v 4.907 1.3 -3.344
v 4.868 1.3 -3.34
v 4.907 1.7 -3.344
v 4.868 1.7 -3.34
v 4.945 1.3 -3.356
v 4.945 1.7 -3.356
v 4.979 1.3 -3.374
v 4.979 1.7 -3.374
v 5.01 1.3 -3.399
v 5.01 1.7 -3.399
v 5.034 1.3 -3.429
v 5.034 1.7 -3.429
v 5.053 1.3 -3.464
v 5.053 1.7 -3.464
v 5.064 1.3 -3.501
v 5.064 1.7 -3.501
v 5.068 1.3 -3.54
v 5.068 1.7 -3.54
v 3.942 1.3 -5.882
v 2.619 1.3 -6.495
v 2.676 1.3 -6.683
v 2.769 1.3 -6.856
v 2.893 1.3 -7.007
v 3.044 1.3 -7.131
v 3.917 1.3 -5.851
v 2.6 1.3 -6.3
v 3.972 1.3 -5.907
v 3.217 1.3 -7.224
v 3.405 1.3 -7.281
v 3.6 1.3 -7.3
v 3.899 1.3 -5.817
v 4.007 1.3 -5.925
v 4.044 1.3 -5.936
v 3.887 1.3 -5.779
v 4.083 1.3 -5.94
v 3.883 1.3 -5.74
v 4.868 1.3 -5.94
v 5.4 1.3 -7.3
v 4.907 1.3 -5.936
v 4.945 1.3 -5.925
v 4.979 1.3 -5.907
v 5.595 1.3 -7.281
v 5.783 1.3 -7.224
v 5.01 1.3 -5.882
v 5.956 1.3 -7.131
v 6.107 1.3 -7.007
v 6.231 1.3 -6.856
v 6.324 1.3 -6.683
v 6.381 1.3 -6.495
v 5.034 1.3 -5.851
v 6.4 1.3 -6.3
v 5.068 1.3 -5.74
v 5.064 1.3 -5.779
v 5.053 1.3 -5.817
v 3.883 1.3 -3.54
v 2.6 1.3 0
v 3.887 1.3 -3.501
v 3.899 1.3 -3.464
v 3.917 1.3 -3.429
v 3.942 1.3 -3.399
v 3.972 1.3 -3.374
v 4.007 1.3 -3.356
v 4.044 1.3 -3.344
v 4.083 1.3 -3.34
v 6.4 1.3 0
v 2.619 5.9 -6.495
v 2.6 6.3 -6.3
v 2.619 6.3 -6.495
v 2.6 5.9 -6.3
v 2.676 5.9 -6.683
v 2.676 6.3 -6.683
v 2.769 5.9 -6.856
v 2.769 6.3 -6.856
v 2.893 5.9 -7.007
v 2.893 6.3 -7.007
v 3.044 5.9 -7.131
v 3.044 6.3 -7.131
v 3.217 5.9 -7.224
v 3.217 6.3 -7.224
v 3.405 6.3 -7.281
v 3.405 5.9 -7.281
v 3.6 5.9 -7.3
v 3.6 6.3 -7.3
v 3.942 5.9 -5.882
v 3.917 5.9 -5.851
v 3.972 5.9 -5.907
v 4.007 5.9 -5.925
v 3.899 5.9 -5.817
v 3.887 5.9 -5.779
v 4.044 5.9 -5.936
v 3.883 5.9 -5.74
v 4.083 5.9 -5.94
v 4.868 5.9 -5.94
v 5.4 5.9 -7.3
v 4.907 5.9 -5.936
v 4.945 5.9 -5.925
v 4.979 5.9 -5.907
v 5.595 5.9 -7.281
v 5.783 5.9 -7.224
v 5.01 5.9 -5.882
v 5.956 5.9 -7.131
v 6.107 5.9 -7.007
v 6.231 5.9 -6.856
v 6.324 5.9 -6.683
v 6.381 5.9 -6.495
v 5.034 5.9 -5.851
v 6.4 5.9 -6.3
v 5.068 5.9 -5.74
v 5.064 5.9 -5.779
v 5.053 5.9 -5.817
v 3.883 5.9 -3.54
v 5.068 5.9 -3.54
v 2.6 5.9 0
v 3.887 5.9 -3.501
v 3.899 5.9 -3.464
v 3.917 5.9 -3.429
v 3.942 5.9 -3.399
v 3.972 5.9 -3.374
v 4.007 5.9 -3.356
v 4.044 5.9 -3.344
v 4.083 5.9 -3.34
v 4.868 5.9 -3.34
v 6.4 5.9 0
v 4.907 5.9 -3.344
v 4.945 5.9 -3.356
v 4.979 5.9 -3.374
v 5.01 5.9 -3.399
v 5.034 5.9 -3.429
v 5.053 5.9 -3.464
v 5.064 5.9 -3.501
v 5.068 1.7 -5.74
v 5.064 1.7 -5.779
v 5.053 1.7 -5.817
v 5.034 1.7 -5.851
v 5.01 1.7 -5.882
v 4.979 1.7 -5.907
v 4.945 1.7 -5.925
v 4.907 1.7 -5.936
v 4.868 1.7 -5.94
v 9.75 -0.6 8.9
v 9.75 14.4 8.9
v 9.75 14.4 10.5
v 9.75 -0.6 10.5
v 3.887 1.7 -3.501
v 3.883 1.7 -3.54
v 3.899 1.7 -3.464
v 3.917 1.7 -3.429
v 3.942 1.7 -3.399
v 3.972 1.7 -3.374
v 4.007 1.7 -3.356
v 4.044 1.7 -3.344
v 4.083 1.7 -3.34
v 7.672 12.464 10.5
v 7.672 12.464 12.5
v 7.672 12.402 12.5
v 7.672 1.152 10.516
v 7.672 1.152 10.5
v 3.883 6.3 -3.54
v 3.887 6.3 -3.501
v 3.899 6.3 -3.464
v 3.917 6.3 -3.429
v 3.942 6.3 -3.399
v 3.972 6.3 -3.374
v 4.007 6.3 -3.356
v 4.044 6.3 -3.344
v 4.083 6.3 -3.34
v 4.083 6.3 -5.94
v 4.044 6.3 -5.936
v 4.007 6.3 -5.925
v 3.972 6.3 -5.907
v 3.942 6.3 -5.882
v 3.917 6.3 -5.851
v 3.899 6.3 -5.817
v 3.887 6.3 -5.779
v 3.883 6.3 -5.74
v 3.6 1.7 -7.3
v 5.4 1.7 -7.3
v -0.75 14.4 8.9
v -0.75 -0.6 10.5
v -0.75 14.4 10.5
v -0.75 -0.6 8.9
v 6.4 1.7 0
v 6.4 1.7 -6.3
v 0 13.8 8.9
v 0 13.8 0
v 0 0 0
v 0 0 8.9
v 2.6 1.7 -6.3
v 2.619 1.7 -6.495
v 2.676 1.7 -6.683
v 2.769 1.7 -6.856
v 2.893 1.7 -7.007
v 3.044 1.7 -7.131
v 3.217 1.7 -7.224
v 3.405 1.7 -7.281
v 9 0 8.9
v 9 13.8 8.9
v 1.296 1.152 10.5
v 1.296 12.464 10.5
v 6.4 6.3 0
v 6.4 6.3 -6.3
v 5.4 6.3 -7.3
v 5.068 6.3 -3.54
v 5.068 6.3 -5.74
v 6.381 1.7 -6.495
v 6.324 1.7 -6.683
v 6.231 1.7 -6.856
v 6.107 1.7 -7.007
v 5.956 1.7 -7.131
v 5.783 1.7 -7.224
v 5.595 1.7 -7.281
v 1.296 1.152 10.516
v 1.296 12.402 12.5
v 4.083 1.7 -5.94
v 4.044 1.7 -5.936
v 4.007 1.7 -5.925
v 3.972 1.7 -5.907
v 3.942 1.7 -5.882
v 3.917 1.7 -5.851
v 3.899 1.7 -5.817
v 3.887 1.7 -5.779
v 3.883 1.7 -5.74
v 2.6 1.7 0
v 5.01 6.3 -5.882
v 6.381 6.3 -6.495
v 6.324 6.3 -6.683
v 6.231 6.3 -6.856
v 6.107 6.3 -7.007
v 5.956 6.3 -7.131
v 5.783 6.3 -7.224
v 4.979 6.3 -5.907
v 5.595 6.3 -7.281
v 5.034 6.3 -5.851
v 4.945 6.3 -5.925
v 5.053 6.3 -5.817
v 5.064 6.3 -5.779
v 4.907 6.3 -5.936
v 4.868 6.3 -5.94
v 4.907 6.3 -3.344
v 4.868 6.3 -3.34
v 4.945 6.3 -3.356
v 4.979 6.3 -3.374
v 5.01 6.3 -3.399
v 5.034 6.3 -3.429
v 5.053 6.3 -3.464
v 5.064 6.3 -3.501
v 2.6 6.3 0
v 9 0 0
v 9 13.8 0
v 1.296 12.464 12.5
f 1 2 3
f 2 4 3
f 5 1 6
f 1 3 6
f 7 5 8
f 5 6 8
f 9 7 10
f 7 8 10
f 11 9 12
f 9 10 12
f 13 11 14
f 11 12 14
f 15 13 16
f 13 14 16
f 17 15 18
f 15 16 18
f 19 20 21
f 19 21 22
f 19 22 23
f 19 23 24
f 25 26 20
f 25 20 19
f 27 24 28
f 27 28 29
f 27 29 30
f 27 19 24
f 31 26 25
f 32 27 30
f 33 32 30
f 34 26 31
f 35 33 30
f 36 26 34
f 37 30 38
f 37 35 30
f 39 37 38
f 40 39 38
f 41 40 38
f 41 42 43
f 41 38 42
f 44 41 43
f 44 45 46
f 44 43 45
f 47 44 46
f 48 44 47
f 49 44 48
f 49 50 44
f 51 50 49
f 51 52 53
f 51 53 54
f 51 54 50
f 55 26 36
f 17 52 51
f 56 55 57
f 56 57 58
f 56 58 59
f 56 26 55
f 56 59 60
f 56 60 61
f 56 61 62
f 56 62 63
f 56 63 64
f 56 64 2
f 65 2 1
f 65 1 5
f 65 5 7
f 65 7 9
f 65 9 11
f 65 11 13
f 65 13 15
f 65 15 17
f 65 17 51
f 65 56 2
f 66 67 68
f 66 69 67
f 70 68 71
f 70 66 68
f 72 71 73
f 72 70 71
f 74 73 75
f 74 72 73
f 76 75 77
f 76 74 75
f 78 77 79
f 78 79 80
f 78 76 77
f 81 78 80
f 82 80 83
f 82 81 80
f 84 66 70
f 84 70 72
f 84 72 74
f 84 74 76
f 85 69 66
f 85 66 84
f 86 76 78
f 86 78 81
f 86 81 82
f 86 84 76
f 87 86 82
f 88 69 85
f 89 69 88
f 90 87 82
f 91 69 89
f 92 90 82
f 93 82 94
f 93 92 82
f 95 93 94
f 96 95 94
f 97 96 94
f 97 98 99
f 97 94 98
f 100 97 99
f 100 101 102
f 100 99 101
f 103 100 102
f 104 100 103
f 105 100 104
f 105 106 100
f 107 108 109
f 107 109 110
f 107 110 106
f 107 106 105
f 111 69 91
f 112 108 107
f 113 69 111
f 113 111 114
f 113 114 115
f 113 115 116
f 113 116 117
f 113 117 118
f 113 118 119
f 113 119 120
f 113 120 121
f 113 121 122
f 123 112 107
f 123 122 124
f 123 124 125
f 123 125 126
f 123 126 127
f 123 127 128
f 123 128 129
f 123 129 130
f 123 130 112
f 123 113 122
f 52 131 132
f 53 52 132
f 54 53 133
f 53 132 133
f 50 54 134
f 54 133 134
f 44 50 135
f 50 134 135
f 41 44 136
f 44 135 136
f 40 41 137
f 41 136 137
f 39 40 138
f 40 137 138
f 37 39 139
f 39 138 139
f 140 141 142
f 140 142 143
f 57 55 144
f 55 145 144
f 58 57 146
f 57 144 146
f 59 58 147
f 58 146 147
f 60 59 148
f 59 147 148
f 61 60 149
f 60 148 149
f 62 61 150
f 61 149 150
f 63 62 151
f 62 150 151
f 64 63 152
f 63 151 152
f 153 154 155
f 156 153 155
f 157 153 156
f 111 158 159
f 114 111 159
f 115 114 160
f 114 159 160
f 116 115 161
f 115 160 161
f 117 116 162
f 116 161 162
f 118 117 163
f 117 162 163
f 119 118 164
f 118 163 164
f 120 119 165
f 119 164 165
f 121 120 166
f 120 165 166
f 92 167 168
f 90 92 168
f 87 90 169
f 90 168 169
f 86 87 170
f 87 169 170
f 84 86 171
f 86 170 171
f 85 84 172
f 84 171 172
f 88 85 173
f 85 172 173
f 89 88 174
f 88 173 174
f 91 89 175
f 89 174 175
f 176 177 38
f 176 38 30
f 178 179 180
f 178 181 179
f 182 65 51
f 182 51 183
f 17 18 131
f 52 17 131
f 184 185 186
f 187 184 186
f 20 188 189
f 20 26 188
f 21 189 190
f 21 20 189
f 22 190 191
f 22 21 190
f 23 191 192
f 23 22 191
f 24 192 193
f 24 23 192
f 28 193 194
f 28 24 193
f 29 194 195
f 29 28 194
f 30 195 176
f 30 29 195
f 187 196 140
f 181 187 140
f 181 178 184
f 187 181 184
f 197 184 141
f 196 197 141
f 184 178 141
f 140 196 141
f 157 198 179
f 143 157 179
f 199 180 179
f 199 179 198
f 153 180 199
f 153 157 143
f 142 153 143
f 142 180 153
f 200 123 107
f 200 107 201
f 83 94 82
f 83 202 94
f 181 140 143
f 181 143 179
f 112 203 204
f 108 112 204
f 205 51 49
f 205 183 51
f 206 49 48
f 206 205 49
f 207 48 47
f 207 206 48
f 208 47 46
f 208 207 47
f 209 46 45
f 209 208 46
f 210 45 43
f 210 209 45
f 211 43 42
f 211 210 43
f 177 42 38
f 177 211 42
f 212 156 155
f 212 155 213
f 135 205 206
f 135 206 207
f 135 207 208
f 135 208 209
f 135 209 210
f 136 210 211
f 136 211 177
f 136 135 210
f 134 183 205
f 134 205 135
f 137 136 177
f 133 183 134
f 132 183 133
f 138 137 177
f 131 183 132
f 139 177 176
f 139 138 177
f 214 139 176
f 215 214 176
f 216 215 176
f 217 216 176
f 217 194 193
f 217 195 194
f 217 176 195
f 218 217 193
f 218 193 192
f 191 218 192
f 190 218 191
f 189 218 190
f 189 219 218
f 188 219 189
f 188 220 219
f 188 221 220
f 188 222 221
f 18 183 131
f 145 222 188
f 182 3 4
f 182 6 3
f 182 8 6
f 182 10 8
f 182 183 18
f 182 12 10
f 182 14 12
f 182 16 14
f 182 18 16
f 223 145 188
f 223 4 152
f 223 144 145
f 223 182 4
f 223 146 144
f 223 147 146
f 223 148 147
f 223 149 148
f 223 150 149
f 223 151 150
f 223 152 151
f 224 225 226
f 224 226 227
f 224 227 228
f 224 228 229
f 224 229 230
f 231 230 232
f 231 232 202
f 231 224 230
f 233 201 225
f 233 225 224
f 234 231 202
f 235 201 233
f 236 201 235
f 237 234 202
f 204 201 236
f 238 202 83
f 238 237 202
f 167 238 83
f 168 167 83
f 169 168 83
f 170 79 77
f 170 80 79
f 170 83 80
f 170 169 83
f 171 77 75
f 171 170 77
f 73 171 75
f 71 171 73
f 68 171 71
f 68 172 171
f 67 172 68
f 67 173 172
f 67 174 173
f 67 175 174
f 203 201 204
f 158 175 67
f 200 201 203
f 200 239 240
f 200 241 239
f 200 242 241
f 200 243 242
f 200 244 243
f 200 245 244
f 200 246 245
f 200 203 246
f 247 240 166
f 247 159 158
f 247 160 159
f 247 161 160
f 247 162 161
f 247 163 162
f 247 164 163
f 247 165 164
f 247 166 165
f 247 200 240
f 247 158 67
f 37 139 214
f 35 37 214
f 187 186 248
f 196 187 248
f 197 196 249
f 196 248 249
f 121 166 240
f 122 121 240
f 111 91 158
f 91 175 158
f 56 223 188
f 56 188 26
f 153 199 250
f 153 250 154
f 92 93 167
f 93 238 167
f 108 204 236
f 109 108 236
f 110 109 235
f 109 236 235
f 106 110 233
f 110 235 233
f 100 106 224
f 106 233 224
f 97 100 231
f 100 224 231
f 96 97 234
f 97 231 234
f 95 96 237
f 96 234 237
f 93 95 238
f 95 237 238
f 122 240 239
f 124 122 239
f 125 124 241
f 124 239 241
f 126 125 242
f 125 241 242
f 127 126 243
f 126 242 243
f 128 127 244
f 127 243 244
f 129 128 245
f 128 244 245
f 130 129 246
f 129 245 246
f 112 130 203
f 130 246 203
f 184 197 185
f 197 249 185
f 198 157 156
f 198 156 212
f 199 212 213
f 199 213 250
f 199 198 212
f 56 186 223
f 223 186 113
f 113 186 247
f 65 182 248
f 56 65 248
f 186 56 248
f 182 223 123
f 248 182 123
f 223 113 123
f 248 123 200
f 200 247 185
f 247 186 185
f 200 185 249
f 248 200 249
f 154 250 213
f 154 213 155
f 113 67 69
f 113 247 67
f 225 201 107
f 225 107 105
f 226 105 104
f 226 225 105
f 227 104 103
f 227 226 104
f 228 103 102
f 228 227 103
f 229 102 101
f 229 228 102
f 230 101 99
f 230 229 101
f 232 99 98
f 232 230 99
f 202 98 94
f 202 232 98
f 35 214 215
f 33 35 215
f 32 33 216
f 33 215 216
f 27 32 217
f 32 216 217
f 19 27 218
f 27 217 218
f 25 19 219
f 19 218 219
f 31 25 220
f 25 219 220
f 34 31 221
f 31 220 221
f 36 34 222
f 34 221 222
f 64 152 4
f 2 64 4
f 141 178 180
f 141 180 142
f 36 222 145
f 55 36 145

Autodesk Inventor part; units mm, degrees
ref_plane "YZ Plane" through (0, 0, 0) normal (1, 0, 0) x (0, 1, 0)
ref_plane "XZ Plane" through (0, 0, 0) normal (0, 1, 0) x (-1, 0, 0)
ref_plane "XY Plane" through (0, 0, 0) normal (0, 0, 1) x (1, 0, 0)
sketch "Sketch1" plane through (0, 0, 0) normal (0, 0, 1) x (1, 0, 0)
  line L0 (0, 0) -> (9, 0)
  line L1 (9, 0) -> (9, 13.8)
  line L2 (9, 13.8) -> (0, 13.8)
  line L3 (0, 13.8) -> (0, 0)
  dimension "d0" = 9
  dimension "d1" = 13.8
extrude "Extrusion1" add sketch "Sketch1" along normal blind 8.9
sketch "Sketch2" plane through (0, 0, 8.9) normal (0, 0, 1) x (1, 0, 0)
  line L0 (-0.75, 14.4) -> (9.75, 14.4)
  line L1 (9.75, 14.4) -> (9.75, -0.6)
  line L2 (9.75, -0.6) -> (-0.75, -0.6)
  line L3 (-0.75, -0.6) -> (-0.75, 14.4)
  line L4 (9, 13.8) -> (0, 13.8) projected
  line L5 (0, 13.8) -> (0, 0) projected
  dimension "d4" = 10.5
  dimension "d5" = 15
  dimension "d6" = 0.6
  dimension "d7" = 0.75
extrude "Extrusion2" add sketch "Sketch2" along normal blind 1.6
sketch "Sketch3" plane through (0, 0, 10.5) normal (0, 0, 1) x (1, 0, 0)
  line L0 (1.2958, 12.4644) -> (7.672, 12.4644)
  line L1 (7.672, 12.4644) -> (7.672, 1.1518)
  line L2 (7.672, 1.1518) -> (1.2958, 1.1518)
  line L3 (1.2958, 1.1518) -> (1.2958, 12.4644)
  point P0 (0, 0)
extrude "Extrusion3" add sketch "Sketch3" along normal blind 2
chamfer "Chamfer1" distance 11.25 angle 10 1 edges at (4.4839, 1.1518, 12.5) measured on face at (3.4212, 8.6935, 12.5)
sketch "Sketch4" plane through (0, 0, 0) normal (0, 0, -1) x (-1, 0, 0)
  line L0 (-6.4, 1.7) -> (-2.6, 1.7)
  line L1 (-2.6, 1.7) -> (-2.6, 1.3)
  line L2 (-2.6, 1.3) -> (-6.4, 1.3)
  line L3 (-6.4, 1.3) -> (-6.4, 1.7)
  line L4 (-9, 0) -> (-9, 13.8) projected
  line L5 (0, 0) -> (-9, 0) projected
  point P0 (-6.4, 1.5)
  dimension "d15" = 3.8
  dimension "d16" = 0.4
  dimension "d17" = 2.6
  dimension "d18" = 1.3
extrude "Extrusion4" add sketch "Sketch4" along normal blind 7.3
fillet "Fillet1" radius 1 2 edges at (2.6, 1.5, -7.3) (6.4, 1.5, -7.3)
sketch "Sketch5" plane through (2.6, 1.7, 0) normal (0, 1, 0) x (1, 0, 0)
  line L0 (2.2682, 5.9403) -> (1.4834, 5.9403)
  line L1 (1.2834, 5.7403) -> (1.2834, 3.5404)
  line L2 (1.4834, 3.3404) -> (2.2682, 3.3404)
  line L3 (2.4682, 3.5404) -> (2.4682, 5.7403)
  arc A0 (2.4682, 5.7403) -> (2.2682, 5.9403) centre (2.2682, 5.7403) ccw
  arc A1 (1.4834, 5.9403) -> (1.2834, 5.7403) centre (1.4834, 5.7403) ccw
  arc A2 (2.2682, 3.3404) -> (2.4682, 3.5404) centre (2.2682, 3.5404) ccw
  arc A3 (1.2834, 3.5404) -> (1.4834, 3.3404) centre (1.4834, 3.5404) ccw
  point P0 (-2.6, 0)
  dimension "d22" = 0.2
extrude "Extrusion5" cut sketch "Sketch5" against normal blind 7.3
pattern_linear "Rectangular Pattern1" count 2 spacing 4.6 along (0, 1, 0) of "Extrusion4", "Extrusion5", "Fillet1"
properties part number "rocker_switch"
